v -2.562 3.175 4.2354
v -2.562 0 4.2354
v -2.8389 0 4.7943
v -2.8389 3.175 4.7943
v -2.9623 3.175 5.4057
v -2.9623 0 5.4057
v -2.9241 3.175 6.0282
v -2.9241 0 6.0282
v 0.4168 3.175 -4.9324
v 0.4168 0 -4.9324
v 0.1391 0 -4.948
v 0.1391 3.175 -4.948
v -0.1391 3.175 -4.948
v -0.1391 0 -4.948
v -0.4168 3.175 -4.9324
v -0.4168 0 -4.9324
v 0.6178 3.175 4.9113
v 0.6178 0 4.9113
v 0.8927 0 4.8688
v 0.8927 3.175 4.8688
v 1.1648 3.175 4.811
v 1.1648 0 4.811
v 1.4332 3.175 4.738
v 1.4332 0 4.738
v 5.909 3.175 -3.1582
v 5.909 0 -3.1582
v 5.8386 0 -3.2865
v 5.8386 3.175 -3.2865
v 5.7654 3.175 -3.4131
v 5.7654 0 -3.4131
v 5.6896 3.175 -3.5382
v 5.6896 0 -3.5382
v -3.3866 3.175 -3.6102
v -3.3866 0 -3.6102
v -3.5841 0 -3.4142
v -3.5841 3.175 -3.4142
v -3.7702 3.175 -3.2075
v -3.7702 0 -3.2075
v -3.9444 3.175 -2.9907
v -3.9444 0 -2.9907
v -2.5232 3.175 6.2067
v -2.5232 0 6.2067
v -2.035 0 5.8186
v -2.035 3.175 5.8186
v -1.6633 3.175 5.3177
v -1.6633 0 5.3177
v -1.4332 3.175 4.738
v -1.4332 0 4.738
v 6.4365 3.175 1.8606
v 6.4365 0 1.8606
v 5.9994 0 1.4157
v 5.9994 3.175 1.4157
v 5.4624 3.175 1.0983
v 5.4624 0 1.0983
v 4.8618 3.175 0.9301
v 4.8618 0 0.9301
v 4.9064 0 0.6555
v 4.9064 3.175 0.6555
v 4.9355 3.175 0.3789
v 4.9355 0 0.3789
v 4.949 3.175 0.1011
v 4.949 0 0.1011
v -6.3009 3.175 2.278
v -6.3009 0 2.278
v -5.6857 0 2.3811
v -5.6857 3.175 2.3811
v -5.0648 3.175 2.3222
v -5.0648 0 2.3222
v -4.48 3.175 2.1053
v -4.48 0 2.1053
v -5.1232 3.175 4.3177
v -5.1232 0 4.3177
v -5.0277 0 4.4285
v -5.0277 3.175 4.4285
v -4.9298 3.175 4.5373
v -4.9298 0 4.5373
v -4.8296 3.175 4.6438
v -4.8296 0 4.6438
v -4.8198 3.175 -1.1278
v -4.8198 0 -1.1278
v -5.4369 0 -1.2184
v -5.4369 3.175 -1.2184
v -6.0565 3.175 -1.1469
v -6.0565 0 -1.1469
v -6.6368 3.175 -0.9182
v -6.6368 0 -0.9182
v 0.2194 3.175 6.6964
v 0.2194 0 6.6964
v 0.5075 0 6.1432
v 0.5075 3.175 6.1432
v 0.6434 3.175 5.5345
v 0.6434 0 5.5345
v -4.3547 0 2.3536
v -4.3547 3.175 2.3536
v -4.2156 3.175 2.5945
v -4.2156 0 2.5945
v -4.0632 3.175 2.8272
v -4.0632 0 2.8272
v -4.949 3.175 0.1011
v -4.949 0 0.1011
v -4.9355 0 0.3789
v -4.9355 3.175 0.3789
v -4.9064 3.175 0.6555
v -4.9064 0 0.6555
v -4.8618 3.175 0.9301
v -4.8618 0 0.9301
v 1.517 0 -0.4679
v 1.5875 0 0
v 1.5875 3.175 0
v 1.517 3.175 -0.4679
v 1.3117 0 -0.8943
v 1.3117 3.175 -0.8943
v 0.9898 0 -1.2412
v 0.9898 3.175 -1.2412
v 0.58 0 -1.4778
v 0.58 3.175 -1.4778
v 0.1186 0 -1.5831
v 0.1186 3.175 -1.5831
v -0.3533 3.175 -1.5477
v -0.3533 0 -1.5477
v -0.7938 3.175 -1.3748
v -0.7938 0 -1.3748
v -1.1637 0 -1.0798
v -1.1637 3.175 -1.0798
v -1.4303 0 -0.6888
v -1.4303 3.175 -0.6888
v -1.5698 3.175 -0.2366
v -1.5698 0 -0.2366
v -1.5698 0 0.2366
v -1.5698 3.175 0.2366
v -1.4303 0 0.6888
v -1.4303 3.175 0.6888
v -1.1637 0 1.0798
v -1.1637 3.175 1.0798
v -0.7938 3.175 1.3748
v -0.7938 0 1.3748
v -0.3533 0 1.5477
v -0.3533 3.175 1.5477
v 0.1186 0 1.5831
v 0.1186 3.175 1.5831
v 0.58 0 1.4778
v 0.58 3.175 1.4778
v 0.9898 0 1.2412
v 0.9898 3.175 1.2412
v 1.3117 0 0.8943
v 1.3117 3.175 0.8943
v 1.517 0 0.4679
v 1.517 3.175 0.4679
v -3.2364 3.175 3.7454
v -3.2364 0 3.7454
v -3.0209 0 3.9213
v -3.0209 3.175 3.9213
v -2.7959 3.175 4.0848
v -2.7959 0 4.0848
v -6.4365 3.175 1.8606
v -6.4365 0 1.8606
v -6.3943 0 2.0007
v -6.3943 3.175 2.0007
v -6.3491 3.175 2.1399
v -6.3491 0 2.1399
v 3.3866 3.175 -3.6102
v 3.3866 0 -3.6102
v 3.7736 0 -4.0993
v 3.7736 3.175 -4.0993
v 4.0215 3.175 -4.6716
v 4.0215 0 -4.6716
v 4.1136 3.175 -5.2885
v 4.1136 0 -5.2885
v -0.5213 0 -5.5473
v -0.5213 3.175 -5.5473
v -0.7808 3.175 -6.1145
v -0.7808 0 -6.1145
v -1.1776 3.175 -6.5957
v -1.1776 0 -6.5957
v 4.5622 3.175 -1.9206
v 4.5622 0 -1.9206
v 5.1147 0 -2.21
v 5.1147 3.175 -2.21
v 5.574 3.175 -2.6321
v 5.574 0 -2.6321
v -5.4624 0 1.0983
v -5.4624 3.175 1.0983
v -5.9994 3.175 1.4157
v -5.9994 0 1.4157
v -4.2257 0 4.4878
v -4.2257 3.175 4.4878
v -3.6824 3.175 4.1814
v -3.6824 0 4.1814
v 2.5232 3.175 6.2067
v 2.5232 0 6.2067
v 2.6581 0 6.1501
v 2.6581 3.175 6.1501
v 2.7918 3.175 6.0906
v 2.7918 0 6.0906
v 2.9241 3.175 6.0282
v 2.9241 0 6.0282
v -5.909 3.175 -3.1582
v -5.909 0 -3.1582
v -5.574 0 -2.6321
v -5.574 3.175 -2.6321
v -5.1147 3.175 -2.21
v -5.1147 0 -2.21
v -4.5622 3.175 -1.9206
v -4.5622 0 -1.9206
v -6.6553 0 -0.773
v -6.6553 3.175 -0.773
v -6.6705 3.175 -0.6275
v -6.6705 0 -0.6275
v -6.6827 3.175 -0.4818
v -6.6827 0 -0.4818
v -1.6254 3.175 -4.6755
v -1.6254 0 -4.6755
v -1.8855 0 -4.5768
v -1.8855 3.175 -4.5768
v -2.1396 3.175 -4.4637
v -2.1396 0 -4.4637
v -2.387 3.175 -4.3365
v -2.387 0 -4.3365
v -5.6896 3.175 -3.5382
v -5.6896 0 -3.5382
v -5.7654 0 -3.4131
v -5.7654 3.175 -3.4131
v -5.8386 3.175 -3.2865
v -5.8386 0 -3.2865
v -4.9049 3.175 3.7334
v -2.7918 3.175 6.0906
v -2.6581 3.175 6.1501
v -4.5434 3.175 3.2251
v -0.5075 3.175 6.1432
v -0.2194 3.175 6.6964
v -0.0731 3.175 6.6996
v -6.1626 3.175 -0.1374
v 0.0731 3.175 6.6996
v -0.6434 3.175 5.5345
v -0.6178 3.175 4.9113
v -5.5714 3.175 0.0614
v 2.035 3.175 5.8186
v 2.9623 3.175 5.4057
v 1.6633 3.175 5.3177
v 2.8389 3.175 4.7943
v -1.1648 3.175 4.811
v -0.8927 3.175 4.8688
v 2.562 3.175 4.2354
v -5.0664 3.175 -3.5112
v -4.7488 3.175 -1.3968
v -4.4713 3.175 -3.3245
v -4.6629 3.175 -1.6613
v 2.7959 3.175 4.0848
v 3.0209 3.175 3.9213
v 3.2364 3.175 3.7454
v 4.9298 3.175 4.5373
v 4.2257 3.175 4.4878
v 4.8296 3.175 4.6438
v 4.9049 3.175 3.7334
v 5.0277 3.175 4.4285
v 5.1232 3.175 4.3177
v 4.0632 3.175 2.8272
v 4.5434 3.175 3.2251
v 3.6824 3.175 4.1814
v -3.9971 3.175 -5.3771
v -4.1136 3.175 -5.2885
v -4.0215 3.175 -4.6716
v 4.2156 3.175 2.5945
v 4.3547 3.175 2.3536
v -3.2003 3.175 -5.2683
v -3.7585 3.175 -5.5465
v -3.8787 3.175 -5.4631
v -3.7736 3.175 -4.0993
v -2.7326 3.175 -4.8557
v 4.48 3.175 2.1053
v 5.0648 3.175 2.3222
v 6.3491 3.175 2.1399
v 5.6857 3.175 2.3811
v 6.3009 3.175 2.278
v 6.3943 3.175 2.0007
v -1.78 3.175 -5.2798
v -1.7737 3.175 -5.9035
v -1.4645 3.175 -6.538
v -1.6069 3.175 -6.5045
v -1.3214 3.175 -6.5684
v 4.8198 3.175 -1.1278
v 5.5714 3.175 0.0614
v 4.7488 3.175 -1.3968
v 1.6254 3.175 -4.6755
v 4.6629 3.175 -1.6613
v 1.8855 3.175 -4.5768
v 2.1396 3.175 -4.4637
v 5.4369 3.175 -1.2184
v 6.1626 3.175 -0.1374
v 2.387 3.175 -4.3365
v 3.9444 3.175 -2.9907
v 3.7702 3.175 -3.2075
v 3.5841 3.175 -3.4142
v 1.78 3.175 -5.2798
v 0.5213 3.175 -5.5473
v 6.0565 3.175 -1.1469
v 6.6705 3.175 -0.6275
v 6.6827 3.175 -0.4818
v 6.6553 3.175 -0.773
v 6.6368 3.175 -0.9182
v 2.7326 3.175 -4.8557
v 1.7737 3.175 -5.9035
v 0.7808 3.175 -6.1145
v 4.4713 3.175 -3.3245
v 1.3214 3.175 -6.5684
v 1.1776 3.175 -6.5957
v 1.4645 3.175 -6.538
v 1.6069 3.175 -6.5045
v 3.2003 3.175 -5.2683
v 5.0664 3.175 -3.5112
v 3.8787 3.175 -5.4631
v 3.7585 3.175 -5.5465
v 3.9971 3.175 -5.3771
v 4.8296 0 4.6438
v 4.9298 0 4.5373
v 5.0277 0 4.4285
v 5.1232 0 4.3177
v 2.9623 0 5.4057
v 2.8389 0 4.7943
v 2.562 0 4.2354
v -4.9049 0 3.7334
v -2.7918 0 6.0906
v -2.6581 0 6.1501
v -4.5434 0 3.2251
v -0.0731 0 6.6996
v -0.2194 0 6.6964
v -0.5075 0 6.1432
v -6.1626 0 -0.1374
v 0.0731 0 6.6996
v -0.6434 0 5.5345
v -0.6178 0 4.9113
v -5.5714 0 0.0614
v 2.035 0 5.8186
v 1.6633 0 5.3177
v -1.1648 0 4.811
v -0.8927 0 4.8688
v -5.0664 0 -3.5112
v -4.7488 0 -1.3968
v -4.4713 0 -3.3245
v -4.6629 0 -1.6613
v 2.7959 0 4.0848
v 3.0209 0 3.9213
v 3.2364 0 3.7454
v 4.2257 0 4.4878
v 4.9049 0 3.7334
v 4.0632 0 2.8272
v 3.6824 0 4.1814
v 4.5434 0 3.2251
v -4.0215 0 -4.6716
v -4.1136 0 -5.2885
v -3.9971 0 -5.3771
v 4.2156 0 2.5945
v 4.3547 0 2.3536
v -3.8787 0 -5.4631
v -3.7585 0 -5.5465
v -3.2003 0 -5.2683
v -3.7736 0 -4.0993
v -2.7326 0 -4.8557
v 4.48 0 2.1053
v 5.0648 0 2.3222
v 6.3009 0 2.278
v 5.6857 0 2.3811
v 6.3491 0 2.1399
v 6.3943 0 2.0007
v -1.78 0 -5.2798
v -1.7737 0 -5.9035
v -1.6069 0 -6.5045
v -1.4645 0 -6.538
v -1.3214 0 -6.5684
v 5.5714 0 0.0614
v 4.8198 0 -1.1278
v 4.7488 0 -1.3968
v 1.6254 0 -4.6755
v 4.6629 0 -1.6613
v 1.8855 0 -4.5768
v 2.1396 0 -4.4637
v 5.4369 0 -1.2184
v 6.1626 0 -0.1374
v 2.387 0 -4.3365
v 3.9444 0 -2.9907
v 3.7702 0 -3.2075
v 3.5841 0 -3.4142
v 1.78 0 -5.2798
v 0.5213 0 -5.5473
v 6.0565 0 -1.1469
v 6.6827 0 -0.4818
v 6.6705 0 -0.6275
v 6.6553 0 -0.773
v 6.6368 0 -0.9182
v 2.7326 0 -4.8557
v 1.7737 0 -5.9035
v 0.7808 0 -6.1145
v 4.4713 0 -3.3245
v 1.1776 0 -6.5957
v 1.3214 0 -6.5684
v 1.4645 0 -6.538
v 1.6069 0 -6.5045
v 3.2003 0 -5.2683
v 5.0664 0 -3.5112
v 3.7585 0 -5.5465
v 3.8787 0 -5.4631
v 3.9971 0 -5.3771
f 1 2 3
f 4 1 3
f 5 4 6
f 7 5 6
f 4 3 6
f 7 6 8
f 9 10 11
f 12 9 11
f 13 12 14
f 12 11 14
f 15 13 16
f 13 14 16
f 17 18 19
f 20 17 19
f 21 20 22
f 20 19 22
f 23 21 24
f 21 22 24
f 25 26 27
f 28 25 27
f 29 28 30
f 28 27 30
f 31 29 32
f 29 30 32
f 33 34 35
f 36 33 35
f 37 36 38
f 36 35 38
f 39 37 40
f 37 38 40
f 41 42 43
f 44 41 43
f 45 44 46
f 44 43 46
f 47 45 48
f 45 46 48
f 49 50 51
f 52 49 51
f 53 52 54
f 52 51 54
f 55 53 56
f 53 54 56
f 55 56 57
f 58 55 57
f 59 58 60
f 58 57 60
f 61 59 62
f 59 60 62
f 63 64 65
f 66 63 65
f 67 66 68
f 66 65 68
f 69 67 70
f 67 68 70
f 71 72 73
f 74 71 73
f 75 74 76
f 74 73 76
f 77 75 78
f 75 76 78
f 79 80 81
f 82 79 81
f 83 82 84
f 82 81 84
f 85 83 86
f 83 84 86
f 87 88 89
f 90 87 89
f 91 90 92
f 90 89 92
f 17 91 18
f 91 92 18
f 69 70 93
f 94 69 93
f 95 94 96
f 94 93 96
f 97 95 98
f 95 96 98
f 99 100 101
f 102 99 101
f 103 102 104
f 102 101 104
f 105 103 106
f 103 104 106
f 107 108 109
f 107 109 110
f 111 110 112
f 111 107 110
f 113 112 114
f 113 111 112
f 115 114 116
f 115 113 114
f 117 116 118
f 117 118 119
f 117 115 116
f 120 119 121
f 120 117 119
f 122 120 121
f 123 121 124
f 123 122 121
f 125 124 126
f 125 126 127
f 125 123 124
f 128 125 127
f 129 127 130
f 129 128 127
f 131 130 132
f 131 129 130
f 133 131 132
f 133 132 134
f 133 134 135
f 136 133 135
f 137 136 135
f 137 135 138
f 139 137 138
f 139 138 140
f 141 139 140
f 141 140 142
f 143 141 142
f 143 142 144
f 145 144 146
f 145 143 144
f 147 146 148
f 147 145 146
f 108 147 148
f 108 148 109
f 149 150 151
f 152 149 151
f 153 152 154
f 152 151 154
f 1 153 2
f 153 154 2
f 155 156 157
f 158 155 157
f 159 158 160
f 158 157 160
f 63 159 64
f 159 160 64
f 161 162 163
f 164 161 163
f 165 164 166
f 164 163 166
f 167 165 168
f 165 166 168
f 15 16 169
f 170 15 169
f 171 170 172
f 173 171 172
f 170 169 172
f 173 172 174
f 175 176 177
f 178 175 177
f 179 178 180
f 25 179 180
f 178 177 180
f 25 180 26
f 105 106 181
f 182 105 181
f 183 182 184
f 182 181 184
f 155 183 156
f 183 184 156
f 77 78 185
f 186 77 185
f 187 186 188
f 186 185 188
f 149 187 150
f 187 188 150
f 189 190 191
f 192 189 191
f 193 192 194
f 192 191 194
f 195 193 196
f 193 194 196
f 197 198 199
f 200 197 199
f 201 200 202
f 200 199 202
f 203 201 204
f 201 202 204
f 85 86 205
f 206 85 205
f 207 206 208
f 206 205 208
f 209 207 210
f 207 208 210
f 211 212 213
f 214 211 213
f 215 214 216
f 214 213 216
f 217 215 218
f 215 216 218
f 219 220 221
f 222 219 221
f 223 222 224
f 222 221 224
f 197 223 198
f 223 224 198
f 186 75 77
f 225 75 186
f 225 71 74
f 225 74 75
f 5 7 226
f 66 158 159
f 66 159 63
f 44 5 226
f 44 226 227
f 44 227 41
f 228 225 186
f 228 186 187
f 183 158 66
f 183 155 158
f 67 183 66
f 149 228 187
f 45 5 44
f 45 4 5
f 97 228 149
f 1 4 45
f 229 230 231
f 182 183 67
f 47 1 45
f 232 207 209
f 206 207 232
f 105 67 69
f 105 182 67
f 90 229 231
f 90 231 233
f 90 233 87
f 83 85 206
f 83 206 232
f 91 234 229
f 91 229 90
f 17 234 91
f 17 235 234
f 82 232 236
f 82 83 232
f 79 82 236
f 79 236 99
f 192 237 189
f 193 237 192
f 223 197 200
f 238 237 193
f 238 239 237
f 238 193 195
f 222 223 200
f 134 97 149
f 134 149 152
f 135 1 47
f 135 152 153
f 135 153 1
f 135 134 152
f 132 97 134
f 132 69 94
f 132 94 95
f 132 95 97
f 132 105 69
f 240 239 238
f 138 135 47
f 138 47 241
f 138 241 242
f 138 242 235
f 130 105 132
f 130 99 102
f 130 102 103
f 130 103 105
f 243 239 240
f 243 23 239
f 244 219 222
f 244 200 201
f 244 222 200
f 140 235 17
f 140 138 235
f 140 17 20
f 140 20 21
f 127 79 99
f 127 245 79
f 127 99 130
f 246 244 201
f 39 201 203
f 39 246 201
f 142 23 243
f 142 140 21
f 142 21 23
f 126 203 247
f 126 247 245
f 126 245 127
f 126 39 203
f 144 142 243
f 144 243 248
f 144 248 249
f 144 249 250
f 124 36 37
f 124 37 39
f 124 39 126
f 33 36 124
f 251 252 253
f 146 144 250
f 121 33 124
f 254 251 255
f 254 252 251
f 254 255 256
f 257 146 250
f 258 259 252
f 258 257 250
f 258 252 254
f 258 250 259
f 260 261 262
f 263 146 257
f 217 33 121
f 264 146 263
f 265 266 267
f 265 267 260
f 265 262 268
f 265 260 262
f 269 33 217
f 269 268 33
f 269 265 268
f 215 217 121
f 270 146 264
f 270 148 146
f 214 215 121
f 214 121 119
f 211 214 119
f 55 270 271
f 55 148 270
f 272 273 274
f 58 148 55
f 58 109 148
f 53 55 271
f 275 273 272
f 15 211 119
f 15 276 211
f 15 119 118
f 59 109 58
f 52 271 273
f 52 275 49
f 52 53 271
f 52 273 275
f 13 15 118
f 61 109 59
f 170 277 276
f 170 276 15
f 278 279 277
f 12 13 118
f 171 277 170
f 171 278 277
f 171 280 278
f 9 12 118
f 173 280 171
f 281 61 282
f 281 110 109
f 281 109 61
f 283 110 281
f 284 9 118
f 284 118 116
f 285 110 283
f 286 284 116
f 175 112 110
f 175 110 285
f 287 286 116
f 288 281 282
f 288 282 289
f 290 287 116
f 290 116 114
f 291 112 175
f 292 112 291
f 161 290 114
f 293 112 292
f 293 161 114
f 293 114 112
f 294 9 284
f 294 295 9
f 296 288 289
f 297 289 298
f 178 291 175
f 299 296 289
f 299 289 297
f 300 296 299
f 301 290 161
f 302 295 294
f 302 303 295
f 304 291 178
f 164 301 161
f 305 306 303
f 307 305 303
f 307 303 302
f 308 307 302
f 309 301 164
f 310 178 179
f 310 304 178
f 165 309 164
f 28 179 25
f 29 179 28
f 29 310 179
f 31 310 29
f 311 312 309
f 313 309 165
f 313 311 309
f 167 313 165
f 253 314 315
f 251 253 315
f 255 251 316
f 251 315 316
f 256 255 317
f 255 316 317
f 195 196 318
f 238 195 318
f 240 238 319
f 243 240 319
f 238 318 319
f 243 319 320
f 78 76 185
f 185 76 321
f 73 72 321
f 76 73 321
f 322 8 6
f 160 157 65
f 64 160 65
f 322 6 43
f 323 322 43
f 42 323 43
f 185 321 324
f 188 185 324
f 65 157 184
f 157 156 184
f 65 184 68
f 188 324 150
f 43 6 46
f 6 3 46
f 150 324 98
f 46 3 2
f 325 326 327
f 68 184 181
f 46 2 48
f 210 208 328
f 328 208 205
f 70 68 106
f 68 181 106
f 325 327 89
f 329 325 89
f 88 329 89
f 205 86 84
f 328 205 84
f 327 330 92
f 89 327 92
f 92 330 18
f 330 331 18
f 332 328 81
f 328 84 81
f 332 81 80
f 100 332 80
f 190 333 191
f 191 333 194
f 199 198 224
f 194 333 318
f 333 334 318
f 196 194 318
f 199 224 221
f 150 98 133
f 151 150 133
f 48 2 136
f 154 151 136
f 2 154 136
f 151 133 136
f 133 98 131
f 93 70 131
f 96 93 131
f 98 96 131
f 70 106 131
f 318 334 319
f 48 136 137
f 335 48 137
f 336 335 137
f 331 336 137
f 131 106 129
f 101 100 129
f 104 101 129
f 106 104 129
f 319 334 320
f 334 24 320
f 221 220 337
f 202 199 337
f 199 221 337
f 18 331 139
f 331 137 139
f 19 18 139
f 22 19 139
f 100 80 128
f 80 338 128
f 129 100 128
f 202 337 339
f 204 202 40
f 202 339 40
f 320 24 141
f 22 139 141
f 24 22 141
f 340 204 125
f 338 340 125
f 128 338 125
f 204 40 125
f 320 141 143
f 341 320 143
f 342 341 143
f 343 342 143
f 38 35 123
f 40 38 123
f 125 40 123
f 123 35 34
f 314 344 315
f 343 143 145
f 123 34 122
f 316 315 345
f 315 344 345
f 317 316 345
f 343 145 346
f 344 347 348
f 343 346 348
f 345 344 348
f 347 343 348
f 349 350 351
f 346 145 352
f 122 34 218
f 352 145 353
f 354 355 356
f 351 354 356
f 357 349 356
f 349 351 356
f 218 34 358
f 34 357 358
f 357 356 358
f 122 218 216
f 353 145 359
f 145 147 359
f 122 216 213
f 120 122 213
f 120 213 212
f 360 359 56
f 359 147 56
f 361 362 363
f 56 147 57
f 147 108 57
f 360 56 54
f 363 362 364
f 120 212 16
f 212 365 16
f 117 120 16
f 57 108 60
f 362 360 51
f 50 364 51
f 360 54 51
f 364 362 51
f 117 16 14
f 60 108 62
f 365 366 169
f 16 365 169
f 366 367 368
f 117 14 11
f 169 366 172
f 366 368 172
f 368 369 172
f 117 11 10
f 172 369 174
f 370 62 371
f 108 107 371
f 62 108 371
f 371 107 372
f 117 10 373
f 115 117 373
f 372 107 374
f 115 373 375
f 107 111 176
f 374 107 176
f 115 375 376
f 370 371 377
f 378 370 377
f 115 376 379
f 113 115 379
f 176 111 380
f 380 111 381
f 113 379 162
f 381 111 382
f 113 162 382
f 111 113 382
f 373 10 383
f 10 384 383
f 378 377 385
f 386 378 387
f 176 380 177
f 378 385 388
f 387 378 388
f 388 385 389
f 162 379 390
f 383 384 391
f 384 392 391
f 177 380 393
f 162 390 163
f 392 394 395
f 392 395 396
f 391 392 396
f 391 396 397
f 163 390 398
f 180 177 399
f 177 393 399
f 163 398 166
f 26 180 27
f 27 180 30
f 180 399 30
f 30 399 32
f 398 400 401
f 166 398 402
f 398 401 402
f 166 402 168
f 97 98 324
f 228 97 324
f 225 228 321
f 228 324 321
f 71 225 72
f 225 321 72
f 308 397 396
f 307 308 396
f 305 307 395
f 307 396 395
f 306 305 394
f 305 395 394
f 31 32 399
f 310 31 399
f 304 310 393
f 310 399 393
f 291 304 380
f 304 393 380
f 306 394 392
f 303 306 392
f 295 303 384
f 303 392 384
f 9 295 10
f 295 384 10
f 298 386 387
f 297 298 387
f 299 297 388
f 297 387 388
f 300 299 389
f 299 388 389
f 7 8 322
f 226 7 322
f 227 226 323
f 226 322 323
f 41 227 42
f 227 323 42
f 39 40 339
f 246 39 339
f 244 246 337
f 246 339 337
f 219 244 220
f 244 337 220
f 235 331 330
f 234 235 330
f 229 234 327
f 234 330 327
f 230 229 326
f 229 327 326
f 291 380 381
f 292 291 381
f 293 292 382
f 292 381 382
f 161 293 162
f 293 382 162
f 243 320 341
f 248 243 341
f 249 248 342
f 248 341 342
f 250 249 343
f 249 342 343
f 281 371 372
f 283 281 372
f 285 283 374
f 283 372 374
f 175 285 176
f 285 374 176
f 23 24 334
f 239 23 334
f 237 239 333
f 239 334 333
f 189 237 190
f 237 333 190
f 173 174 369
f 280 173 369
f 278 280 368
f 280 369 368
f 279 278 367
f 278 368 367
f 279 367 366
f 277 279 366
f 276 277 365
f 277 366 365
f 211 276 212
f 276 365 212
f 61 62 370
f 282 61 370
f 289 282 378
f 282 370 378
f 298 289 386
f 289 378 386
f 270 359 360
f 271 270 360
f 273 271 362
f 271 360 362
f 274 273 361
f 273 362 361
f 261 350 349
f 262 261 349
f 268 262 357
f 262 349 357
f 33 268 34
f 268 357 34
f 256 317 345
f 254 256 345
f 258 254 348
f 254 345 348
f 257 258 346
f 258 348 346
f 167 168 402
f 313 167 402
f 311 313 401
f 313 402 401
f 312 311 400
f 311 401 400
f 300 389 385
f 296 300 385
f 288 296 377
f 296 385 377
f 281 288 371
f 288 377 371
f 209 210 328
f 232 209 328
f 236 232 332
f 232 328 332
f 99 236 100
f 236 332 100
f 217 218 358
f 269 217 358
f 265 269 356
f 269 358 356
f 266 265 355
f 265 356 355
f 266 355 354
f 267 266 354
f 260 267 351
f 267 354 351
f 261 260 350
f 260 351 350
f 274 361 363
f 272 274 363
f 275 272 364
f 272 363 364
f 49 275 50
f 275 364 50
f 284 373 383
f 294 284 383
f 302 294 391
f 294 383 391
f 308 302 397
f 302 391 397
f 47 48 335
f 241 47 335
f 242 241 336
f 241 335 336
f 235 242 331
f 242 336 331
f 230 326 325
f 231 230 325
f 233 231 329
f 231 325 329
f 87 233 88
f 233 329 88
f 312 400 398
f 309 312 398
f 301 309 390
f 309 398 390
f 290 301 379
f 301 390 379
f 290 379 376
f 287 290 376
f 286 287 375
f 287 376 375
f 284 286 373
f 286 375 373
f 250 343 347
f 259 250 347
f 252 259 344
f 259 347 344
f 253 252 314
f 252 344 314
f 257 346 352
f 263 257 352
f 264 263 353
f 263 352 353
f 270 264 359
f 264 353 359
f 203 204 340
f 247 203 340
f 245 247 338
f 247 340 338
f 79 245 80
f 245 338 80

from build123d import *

# Parameters (mm, degrees)
SKETCH1_R           = 1.5875
BOSS_EXTRUDE1_DEPTH = 3.175


with BuildPart() as part:
    # Sketch1 → Boss-Extrude1 (new body)
    with BuildSketch(Plane(origin=(0, 0, 0), x_dir=(1, 0, 0), z_dir=(0, 1, 0))):
        with BuildLine():
            ThreePointArc((-1.625434965, 4.675517209), (-2.013346383, 4.522050015), (-2.386958137, 4.336465249))
            ThreePointArc((-2.386958137, 4.336465249), (-2.952961664, 5.077251852), (-3.758538597, 5.546475243))
            ThreePointArc((-3.758538597, 5.546475243), (-3.93816119, 5.420413862), (-4.113559122, 5.288537733))
            ThreePointArc((-4.113559122, 5.288537733), (-3.916238121, 4.37739054), (-3.386612903, 3.610173548))
            ThreePointArc((-3.386612903, 3.610173548), (-3.678566886, 3.312196501), (-3.944394082, 2.99069479))
            ThreePointArc((-3.944394082, 2.99069479), (-4.762769089, 3.437222652), (-5.689550583, 3.538221892))
            ThreePointArc((-5.689550583, 3.538221892), (-5.802370205, 3.35), (-5.908965335, 3.158184395))
            ThreePointArc((-5.908965335, 3.158184395), (-5.35810668, 2.406067698), (-4.562214704, 1.920598082))
            ThreePointArc((-4.562214704, 1.920598082), (-4.707729756, 1.529634122), (-4.819808456, 1.127806033))
            ThreePointArc((-4.819808456, 1.127806033), (-5.74905047, 1.20286643), (-6.636787586, 0.918177833))
            ThreePointArc((-6.636787586, 0.918177833), (-6.663296699, 0.700340704), (-6.68265776, 0.481752285))
            ThreePointArc((-6.68265776, 0.481752285), (-5.873509917, 0.018713892), (-4.948968136, -0.10106624))
            ThreePointArc((-4.948968136, -0.10106624), (-4.922883382, -0.517415893), (-4.861834162, -0.930090633))
            ThreePointArc((-4.861834162, -0.930090633), (-5.741268797, -1.239476326), (-6.436463722, -1.860627515))
            ThreePointArc((-6.436463722, -1.860627515), (-6.372078659, -2.070413862), (-6.300857949, -2.277979173))
            ThreePointArc((-6.300857949, -2.277979173), (-5.373329931, -2.371875716), (-4.480000018, -2.105255291))
            ThreePointArc((-4.480000018, -2.105255291), (-4.286825749, -2.475), (-4.063204572, -2.827166179))
            ThreePointArc((-4.063204572, -2.827166179), (-4.74076959, -3.467502365), (-5.123216807, -4.317713463))
            ThreePointArc((-5.123216807, -4.317713463), (-4.979070331, -4.483175063), (-4.829582556, -4.643827336))
            ThreePointArc((-4.829582556, -4.643827336), (-3.944052384, -4.352346465), (-3.236399197, -3.745426576))
            ThreePointArc((-3.236399197, -3.745426576), (-2.909536999, -4.004634122), (-2.562009999, -4.235399009))
            ThreePointArc((-2.562009999, -4.235399009), (-2.920548253, -5.095965744), (-2.924119163, -6.028227527))
            ThreePointArc((-2.924119163, -6.028227527), (-2.725135509, -6.120754566), (-2.523228465, -6.206715566))
            ThreePointArc((-2.523228465, -6.206715566), (-1.83281235, -5.58025697), (-1.433195553, -4.737979581))
            ThreePointArc((-1.433195553, -4.737979581), (-1.02916287, -4.841830624), (-0.617820622, -4.911292872))
            ThreePointArc((-0.617820622, -4.911292872), (-0.595337591, -5.84329035), (-0.219414751, -6.696406287))
            ThreePointArc((-0.219414751, -6.696406287), (0, -6.7), (0.219414751, -6.696406287))
            ThreePointArc((0.219414751, -6.696406287), (0.595337591, -5.84329035), (0.617820622, -4.911292872))
            ThreePointArc((0.617820622, -4.911292872), (1.02916287, -4.841830624), (1.433195553, -4.737979581))
            ThreePointArc((1.433195553, -4.737979581), (1.83281235, -5.58025697), (2.523228465, -6.206715566))
            ThreePointArc((2.523228465, -6.206715566), (2.725135509, -6.120754566), (2.924119163, -6.028227527))
            ThreePointArc((2.924119163, -6.028227527), (2.920548253, -5.095965744), (2.562009999, -4.235399009))
            ThreePointArc((2.562009999, -4.235399009), (2.909536999, -4.004634122), (3.236399197, -3.745426576))
            ThreePointArc((3.236399197, -3.745426576), (3.944052384, -4.352346465), (4.829582556, -4.643827336))
            ThreePointArc((4.829582556, -4.643827336), (4.979070331, -4.483175063), (5.123216807, -4.317713463))
            ThreePointArc((5.123216807, -4.317713463), (4.74076959, -3.467502365), (4.063204572, -2.827166179))
            ThreePointArc((4.063204572, -2.827166179), (4.286825749, -2.475), (4.480000018, -2.105255291))
            ThreePointArc((4.480000018, -2.105255291), (5.373329931, -2.371875716), (6.300857949, -2.277979173))
            ThreePointArc((6.300857949, -2.277979173), (6.372078659, -2.070413862), (6.436463722, -1.860627515))
            ThreePointArc((6.436463722, -1.860627515), (5.741268797, -1.239476326), (4.861834162, -0.930090633))
            ThreePointArc((4.861834162, -0.930090633), (4.922883382, -0.517415893), (4.948968136, -0.10106624))
            ThreePointArc((4.948968136, -0.10106624), (5.873509917, 0.018713892), (6.68265776, 0.481752285))
            ThreePointArc((6.68265776, 0.481752285), (6.663296699, 0.700340704), (6.636787586, 0.918177833))
            ThreePointArc((6.636787586, 0.918177833), (5.74905047, 1.20286643), (4.819808456, 1.127806033))
            ThreePointArc((4.819808456, 1.127806033), (4.707729756, 1.529634122), (4.562214704, 1.920598082))
            ThreePointArc((4.562214704, 1.920598082), (5.35810668, 2.406067698), (5.908965335, 3.158184395))
            ThreePointArc((5.908965335, 3.158184395), (5.802370205, 3.35), (5.689550583, 3.538221892))
            ThreePointArc((5.689550583, 3.538221892), (4.762769089, 3.437222652), (3.944394082, 2.99069479))
            ThreePointArc((3.944394082, 2.99069479), (3.678566886, 3.312196501), (3.386612903, 3.610173548))
            ThreePointArc((3.386612903, 3.610173548), (3.916238121, 4.37739054), (4.113559122, 5.288537733))
            ThreePointArc((4.113559122, 5.288537733), (3.93816119, 5.420413862), (3.758538597, 5.546475243))
            ThreePointArc((3.758538597, 5.546475243), (2.952961664, 5.077251852), (2.386958137, 4.336465249))
            ThreePointArc((2.386958137, 4.336465249), (2.013346383, 4.522050015), (1.625434965, 4.675517209))
            ThreePointArc((1.625434965, 4.675517209), (1.797216412, 5.591822791), (1.606881166, 6.504454852))
            ThreePointArc((1.606881166, 6.504454852), (1.393008328, 6.553588925), (1.177641141, 6.595692636))
            ThreePointArc((1.177641141, 6.595692636), (0.632560341, 5.839378081), (0.416795446, 4.93242147))
            ThreePointArc((0.416795446, 4.93242147), (0, 4.95), (-0.416795446, 4.93242147))
            ThreePointArc((-0.416795446, 4.93242147), (-0.632560341, 5.839378081), (-1.177641141, 6.595692636))
            ThreePointArc((-1.177641141, 6.595692636), (-1.393008328, 6.553588925), (-1.606881166, 6.504454852))
            ThreePointArc((-1.606881166, 6.504454852), (-1.797216412, 5.591822791), (-1.625434965, 4.675517209))
        make_face()
        Circle(SKETCH1_R, mode=Mode.SUBTRACT)
    extrude(amount=BOSS_EXTRUDE1_DEPTH)


solid = part.part
